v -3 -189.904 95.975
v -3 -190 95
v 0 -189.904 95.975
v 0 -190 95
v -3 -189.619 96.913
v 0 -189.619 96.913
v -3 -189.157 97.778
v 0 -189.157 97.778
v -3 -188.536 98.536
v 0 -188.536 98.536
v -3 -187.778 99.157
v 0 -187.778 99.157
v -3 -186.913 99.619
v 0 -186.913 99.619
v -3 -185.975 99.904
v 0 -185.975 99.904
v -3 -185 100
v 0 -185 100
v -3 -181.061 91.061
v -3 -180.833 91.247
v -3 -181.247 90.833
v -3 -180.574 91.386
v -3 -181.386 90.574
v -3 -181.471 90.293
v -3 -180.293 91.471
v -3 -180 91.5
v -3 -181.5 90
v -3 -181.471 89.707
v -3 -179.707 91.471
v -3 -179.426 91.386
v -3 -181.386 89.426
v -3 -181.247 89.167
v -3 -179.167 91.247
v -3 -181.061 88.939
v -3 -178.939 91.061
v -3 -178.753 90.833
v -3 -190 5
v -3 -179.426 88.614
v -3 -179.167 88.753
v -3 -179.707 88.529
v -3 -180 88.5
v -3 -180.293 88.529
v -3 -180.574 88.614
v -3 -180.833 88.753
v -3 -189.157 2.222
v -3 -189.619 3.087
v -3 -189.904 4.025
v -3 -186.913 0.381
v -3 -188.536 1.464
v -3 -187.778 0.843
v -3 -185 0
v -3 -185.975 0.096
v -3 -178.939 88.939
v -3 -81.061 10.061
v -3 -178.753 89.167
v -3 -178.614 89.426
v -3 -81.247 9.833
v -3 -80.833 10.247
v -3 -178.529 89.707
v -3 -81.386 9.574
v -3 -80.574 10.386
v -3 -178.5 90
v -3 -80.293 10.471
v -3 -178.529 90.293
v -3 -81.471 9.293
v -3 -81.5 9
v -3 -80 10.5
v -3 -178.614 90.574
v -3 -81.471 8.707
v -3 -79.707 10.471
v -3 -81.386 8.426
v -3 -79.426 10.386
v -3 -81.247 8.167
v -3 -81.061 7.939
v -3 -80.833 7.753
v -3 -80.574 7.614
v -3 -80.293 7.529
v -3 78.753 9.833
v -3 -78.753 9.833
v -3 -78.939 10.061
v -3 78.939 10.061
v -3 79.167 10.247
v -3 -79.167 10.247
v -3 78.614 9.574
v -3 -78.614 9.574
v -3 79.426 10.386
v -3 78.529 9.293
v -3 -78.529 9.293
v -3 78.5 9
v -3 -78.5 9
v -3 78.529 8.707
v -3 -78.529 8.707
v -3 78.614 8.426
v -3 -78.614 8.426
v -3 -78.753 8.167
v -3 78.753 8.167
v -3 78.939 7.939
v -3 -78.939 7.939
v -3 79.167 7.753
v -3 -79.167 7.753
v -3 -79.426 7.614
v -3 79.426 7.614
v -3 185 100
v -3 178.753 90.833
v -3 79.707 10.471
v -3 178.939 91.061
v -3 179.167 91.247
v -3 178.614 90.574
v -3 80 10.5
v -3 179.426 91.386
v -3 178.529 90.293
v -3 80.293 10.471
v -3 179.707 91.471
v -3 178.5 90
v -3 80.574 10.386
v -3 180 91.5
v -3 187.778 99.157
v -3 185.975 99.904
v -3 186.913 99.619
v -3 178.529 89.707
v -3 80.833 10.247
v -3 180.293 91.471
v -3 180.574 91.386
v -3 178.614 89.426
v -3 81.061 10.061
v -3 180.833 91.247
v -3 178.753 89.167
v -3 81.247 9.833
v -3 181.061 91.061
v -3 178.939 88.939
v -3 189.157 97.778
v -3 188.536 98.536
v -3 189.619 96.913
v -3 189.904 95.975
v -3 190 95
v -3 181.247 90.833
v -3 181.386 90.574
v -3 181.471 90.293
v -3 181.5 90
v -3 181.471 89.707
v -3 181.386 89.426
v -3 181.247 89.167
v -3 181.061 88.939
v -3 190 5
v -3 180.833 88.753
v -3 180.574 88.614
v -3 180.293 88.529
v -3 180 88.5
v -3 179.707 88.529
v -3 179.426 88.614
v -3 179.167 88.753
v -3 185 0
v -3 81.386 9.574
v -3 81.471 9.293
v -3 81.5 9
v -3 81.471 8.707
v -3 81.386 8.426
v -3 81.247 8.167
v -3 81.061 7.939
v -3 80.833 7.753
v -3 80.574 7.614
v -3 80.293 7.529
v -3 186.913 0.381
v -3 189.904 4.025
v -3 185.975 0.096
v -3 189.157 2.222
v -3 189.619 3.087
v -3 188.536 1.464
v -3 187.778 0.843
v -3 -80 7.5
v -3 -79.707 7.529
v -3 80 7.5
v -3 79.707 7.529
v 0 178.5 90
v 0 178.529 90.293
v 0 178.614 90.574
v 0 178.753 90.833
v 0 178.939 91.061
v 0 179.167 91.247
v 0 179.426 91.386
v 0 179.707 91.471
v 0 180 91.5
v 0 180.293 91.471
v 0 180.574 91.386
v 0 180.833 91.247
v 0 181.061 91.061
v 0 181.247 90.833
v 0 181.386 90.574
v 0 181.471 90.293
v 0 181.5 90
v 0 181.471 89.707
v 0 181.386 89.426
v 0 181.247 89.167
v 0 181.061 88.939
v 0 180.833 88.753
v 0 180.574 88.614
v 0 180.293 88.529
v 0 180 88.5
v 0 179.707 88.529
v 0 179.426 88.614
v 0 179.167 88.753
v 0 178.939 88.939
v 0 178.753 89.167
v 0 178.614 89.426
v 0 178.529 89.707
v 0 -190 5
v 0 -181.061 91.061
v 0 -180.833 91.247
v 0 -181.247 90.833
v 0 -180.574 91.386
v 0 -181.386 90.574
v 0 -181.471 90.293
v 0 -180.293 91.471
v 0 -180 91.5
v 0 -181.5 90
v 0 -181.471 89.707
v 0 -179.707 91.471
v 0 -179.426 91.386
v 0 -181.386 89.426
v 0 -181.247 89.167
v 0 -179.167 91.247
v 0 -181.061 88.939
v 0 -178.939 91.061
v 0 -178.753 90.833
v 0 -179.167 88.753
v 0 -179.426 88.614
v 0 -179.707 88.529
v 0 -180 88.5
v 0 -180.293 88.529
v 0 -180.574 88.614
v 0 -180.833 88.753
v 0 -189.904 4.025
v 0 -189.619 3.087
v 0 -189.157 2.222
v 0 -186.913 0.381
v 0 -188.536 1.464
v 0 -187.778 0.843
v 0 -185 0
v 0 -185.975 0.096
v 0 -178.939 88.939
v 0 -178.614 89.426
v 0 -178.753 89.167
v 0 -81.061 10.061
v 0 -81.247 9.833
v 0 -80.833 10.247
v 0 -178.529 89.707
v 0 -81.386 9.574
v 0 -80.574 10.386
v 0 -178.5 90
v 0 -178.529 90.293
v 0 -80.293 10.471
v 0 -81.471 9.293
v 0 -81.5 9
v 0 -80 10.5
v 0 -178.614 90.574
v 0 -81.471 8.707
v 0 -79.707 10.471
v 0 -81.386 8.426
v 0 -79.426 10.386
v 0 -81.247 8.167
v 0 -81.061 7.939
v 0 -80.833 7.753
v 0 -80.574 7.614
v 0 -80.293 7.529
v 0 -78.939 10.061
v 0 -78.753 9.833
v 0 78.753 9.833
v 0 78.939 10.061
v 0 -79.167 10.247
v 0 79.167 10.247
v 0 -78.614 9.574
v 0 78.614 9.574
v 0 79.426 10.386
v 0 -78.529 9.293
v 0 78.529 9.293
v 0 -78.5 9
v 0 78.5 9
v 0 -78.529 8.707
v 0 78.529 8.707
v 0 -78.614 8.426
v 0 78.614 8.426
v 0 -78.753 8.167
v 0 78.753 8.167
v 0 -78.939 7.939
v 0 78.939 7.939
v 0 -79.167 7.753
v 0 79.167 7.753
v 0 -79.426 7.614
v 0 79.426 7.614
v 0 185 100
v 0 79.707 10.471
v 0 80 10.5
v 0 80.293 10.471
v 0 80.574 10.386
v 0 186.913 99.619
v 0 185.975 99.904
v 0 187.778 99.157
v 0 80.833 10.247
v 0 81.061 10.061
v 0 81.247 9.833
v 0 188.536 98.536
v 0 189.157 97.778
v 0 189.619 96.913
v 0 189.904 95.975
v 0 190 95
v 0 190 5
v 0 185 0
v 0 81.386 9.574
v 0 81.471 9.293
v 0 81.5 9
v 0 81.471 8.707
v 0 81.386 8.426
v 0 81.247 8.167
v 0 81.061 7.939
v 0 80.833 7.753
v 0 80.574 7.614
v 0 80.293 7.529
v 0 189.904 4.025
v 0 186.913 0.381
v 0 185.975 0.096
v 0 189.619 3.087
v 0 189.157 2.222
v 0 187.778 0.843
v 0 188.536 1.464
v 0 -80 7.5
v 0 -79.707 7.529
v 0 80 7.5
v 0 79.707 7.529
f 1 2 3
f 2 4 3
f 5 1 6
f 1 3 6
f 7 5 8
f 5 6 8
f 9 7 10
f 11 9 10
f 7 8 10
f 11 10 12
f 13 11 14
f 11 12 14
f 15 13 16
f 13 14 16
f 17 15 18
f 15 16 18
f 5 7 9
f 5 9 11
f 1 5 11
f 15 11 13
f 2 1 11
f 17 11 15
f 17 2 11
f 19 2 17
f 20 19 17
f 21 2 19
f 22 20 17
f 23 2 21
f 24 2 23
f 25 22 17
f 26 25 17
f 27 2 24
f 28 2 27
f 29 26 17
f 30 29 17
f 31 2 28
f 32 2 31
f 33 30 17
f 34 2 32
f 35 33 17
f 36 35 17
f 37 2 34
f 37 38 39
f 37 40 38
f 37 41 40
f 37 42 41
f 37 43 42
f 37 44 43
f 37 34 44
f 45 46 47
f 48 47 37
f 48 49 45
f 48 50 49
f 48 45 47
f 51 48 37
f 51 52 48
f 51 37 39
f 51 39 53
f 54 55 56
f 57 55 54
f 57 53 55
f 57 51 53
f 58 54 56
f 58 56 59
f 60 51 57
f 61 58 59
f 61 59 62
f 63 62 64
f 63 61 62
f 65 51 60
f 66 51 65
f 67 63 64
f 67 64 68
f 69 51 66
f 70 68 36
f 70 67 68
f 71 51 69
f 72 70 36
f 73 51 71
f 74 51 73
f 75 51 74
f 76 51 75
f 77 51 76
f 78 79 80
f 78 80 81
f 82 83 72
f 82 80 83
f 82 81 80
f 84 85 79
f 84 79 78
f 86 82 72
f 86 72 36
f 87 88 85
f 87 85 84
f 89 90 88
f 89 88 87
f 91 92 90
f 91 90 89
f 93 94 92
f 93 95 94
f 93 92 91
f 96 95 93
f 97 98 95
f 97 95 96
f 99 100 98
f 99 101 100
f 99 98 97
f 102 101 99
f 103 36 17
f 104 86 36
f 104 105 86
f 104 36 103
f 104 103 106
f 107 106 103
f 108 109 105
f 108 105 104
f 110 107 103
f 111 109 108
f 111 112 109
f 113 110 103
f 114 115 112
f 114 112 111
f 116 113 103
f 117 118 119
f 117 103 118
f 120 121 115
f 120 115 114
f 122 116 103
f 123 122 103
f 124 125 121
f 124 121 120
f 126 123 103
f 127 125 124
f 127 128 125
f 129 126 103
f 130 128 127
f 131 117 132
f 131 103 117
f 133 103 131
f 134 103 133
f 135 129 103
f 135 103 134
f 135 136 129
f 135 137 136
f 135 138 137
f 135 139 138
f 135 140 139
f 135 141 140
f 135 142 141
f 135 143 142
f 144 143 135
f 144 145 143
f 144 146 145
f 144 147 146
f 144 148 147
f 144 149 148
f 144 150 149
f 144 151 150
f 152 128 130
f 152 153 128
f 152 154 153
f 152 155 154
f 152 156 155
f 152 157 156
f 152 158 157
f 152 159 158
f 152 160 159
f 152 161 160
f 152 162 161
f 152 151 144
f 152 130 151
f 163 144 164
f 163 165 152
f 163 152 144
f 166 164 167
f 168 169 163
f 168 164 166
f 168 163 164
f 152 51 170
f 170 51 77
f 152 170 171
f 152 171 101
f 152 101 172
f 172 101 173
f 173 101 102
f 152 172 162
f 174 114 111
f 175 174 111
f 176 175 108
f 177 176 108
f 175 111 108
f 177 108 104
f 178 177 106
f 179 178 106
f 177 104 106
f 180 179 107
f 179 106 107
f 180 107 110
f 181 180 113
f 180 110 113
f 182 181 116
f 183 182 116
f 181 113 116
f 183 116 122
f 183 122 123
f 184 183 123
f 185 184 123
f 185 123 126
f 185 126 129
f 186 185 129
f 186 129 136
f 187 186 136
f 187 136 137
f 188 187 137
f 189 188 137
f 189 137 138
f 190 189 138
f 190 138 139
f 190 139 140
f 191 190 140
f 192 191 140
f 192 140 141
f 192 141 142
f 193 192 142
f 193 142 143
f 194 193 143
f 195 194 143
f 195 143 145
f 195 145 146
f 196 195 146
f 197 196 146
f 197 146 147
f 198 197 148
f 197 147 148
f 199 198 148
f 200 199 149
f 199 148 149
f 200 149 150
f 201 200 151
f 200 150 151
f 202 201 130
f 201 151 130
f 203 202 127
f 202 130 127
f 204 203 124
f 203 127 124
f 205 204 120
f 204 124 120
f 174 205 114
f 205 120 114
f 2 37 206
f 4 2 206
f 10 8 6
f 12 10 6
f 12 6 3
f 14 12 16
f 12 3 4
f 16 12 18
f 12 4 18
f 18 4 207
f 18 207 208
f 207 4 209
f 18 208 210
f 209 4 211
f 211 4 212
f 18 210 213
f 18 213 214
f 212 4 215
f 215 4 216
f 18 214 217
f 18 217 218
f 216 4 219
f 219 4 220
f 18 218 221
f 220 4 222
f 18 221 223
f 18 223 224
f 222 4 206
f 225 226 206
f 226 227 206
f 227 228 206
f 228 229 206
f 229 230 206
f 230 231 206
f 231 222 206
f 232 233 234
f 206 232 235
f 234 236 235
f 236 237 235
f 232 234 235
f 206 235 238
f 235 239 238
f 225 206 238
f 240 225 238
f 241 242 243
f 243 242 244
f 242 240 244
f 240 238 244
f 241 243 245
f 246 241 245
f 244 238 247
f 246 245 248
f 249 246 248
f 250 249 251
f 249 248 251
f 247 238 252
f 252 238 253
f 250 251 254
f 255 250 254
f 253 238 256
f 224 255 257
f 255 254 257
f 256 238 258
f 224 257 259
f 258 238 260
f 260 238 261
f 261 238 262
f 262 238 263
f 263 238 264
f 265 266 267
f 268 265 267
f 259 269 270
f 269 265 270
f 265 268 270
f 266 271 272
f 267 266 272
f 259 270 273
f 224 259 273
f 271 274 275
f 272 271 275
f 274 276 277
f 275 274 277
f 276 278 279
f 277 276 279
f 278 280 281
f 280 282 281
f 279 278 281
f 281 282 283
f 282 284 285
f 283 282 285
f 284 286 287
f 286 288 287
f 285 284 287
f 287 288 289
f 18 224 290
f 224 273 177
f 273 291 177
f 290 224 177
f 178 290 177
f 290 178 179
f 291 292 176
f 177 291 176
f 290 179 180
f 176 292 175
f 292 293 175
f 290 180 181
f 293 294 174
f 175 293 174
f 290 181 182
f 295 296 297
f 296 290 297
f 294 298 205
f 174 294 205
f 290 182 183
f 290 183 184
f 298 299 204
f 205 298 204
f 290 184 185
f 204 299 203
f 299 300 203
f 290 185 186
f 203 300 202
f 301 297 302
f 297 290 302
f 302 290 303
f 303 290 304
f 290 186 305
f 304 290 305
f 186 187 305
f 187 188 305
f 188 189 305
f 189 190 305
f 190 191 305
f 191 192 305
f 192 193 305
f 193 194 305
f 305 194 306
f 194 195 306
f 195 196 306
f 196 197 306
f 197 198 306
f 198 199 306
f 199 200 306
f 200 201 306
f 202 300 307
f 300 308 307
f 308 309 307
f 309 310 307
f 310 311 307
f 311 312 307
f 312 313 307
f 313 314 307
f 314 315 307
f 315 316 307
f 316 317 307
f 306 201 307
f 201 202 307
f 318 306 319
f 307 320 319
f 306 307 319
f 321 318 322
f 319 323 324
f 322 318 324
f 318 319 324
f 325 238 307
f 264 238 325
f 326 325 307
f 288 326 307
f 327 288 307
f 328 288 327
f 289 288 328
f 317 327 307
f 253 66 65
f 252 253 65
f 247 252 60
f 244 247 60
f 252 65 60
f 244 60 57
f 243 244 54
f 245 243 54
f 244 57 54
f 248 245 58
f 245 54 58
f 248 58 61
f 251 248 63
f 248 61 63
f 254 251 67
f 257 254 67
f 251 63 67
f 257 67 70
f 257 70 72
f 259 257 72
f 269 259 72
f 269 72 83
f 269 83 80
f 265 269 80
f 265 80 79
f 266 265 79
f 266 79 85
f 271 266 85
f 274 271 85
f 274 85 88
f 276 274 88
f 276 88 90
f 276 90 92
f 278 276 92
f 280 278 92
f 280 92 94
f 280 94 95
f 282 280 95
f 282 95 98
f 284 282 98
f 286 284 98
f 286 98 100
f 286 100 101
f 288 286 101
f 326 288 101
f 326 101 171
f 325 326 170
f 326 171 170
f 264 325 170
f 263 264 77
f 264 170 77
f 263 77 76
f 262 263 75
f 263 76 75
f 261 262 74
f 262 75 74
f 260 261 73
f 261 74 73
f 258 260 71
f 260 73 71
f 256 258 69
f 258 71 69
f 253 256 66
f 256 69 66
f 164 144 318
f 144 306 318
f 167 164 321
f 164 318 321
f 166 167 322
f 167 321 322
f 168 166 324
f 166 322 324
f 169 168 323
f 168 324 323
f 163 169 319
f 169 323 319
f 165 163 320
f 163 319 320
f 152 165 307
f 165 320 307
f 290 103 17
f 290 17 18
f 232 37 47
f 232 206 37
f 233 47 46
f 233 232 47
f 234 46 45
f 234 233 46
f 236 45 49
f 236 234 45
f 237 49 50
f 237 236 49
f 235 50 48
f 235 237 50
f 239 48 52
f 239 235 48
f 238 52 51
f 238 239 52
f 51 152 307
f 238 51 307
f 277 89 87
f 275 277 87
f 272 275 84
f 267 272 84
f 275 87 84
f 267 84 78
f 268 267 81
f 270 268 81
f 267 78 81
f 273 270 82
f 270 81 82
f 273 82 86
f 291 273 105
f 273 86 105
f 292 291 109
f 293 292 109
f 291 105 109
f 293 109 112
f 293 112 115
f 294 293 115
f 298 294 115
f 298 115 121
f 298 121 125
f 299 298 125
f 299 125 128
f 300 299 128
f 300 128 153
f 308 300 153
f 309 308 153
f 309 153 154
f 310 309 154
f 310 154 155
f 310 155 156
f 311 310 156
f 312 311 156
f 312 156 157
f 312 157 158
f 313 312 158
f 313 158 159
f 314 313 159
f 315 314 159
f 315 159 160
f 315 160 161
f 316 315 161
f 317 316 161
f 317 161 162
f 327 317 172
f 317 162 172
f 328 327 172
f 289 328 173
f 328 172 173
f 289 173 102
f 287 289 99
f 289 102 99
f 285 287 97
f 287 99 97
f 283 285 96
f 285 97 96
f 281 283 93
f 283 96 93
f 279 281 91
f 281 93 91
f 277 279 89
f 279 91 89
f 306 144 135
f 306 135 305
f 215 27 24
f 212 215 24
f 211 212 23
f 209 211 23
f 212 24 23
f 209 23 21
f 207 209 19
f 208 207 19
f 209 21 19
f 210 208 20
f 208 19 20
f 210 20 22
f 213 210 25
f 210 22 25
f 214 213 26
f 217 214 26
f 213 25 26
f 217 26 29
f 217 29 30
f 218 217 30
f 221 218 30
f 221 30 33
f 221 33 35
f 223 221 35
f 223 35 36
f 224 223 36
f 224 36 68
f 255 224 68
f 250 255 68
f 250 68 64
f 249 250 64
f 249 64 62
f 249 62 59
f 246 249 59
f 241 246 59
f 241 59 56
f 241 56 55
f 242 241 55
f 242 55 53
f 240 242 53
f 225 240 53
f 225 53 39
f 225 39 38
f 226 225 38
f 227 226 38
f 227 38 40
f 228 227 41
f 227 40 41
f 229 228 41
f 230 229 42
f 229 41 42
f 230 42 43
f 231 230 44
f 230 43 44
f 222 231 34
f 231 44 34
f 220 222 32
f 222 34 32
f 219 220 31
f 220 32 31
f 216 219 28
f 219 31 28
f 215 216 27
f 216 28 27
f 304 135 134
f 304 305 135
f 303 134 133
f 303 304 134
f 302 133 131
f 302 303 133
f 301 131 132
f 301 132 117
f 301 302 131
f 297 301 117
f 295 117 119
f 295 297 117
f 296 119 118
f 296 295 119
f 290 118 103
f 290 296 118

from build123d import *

# Parameters (mm, degrees)
F0_W     = 3
F0_H     = 380
F1_DEPTH = 100
F2_R     = 5
F4_D     = 3


with BuildPart() as f1:
    # F0 (on Top) → F1 (new body)
    with BuildSketch(Plane.XY):
        with Locations((-1.5, 0)):
            Rectangle(F0_W, F0_H)
    extrude(amount=F1_DEPTH)

    # F2
    f2_edges = [f1.edges().sort_by_distance(p)[0] for p in [
        (-1.5, -190, 100),
        (-1.5, -190, 0),
        (-1.5, 190, 0),
        (-1.5, 190, 100),
    ]]
    fillet(f2_edges, radius=F2_R)

    # F4 (through all)
    with Locations(Plane.YZ):
        with Locations((180, 90), (80, 9), (-80, 9), (-180, 90)):
            Hole(F4_D / 2)


solid = f1.part
